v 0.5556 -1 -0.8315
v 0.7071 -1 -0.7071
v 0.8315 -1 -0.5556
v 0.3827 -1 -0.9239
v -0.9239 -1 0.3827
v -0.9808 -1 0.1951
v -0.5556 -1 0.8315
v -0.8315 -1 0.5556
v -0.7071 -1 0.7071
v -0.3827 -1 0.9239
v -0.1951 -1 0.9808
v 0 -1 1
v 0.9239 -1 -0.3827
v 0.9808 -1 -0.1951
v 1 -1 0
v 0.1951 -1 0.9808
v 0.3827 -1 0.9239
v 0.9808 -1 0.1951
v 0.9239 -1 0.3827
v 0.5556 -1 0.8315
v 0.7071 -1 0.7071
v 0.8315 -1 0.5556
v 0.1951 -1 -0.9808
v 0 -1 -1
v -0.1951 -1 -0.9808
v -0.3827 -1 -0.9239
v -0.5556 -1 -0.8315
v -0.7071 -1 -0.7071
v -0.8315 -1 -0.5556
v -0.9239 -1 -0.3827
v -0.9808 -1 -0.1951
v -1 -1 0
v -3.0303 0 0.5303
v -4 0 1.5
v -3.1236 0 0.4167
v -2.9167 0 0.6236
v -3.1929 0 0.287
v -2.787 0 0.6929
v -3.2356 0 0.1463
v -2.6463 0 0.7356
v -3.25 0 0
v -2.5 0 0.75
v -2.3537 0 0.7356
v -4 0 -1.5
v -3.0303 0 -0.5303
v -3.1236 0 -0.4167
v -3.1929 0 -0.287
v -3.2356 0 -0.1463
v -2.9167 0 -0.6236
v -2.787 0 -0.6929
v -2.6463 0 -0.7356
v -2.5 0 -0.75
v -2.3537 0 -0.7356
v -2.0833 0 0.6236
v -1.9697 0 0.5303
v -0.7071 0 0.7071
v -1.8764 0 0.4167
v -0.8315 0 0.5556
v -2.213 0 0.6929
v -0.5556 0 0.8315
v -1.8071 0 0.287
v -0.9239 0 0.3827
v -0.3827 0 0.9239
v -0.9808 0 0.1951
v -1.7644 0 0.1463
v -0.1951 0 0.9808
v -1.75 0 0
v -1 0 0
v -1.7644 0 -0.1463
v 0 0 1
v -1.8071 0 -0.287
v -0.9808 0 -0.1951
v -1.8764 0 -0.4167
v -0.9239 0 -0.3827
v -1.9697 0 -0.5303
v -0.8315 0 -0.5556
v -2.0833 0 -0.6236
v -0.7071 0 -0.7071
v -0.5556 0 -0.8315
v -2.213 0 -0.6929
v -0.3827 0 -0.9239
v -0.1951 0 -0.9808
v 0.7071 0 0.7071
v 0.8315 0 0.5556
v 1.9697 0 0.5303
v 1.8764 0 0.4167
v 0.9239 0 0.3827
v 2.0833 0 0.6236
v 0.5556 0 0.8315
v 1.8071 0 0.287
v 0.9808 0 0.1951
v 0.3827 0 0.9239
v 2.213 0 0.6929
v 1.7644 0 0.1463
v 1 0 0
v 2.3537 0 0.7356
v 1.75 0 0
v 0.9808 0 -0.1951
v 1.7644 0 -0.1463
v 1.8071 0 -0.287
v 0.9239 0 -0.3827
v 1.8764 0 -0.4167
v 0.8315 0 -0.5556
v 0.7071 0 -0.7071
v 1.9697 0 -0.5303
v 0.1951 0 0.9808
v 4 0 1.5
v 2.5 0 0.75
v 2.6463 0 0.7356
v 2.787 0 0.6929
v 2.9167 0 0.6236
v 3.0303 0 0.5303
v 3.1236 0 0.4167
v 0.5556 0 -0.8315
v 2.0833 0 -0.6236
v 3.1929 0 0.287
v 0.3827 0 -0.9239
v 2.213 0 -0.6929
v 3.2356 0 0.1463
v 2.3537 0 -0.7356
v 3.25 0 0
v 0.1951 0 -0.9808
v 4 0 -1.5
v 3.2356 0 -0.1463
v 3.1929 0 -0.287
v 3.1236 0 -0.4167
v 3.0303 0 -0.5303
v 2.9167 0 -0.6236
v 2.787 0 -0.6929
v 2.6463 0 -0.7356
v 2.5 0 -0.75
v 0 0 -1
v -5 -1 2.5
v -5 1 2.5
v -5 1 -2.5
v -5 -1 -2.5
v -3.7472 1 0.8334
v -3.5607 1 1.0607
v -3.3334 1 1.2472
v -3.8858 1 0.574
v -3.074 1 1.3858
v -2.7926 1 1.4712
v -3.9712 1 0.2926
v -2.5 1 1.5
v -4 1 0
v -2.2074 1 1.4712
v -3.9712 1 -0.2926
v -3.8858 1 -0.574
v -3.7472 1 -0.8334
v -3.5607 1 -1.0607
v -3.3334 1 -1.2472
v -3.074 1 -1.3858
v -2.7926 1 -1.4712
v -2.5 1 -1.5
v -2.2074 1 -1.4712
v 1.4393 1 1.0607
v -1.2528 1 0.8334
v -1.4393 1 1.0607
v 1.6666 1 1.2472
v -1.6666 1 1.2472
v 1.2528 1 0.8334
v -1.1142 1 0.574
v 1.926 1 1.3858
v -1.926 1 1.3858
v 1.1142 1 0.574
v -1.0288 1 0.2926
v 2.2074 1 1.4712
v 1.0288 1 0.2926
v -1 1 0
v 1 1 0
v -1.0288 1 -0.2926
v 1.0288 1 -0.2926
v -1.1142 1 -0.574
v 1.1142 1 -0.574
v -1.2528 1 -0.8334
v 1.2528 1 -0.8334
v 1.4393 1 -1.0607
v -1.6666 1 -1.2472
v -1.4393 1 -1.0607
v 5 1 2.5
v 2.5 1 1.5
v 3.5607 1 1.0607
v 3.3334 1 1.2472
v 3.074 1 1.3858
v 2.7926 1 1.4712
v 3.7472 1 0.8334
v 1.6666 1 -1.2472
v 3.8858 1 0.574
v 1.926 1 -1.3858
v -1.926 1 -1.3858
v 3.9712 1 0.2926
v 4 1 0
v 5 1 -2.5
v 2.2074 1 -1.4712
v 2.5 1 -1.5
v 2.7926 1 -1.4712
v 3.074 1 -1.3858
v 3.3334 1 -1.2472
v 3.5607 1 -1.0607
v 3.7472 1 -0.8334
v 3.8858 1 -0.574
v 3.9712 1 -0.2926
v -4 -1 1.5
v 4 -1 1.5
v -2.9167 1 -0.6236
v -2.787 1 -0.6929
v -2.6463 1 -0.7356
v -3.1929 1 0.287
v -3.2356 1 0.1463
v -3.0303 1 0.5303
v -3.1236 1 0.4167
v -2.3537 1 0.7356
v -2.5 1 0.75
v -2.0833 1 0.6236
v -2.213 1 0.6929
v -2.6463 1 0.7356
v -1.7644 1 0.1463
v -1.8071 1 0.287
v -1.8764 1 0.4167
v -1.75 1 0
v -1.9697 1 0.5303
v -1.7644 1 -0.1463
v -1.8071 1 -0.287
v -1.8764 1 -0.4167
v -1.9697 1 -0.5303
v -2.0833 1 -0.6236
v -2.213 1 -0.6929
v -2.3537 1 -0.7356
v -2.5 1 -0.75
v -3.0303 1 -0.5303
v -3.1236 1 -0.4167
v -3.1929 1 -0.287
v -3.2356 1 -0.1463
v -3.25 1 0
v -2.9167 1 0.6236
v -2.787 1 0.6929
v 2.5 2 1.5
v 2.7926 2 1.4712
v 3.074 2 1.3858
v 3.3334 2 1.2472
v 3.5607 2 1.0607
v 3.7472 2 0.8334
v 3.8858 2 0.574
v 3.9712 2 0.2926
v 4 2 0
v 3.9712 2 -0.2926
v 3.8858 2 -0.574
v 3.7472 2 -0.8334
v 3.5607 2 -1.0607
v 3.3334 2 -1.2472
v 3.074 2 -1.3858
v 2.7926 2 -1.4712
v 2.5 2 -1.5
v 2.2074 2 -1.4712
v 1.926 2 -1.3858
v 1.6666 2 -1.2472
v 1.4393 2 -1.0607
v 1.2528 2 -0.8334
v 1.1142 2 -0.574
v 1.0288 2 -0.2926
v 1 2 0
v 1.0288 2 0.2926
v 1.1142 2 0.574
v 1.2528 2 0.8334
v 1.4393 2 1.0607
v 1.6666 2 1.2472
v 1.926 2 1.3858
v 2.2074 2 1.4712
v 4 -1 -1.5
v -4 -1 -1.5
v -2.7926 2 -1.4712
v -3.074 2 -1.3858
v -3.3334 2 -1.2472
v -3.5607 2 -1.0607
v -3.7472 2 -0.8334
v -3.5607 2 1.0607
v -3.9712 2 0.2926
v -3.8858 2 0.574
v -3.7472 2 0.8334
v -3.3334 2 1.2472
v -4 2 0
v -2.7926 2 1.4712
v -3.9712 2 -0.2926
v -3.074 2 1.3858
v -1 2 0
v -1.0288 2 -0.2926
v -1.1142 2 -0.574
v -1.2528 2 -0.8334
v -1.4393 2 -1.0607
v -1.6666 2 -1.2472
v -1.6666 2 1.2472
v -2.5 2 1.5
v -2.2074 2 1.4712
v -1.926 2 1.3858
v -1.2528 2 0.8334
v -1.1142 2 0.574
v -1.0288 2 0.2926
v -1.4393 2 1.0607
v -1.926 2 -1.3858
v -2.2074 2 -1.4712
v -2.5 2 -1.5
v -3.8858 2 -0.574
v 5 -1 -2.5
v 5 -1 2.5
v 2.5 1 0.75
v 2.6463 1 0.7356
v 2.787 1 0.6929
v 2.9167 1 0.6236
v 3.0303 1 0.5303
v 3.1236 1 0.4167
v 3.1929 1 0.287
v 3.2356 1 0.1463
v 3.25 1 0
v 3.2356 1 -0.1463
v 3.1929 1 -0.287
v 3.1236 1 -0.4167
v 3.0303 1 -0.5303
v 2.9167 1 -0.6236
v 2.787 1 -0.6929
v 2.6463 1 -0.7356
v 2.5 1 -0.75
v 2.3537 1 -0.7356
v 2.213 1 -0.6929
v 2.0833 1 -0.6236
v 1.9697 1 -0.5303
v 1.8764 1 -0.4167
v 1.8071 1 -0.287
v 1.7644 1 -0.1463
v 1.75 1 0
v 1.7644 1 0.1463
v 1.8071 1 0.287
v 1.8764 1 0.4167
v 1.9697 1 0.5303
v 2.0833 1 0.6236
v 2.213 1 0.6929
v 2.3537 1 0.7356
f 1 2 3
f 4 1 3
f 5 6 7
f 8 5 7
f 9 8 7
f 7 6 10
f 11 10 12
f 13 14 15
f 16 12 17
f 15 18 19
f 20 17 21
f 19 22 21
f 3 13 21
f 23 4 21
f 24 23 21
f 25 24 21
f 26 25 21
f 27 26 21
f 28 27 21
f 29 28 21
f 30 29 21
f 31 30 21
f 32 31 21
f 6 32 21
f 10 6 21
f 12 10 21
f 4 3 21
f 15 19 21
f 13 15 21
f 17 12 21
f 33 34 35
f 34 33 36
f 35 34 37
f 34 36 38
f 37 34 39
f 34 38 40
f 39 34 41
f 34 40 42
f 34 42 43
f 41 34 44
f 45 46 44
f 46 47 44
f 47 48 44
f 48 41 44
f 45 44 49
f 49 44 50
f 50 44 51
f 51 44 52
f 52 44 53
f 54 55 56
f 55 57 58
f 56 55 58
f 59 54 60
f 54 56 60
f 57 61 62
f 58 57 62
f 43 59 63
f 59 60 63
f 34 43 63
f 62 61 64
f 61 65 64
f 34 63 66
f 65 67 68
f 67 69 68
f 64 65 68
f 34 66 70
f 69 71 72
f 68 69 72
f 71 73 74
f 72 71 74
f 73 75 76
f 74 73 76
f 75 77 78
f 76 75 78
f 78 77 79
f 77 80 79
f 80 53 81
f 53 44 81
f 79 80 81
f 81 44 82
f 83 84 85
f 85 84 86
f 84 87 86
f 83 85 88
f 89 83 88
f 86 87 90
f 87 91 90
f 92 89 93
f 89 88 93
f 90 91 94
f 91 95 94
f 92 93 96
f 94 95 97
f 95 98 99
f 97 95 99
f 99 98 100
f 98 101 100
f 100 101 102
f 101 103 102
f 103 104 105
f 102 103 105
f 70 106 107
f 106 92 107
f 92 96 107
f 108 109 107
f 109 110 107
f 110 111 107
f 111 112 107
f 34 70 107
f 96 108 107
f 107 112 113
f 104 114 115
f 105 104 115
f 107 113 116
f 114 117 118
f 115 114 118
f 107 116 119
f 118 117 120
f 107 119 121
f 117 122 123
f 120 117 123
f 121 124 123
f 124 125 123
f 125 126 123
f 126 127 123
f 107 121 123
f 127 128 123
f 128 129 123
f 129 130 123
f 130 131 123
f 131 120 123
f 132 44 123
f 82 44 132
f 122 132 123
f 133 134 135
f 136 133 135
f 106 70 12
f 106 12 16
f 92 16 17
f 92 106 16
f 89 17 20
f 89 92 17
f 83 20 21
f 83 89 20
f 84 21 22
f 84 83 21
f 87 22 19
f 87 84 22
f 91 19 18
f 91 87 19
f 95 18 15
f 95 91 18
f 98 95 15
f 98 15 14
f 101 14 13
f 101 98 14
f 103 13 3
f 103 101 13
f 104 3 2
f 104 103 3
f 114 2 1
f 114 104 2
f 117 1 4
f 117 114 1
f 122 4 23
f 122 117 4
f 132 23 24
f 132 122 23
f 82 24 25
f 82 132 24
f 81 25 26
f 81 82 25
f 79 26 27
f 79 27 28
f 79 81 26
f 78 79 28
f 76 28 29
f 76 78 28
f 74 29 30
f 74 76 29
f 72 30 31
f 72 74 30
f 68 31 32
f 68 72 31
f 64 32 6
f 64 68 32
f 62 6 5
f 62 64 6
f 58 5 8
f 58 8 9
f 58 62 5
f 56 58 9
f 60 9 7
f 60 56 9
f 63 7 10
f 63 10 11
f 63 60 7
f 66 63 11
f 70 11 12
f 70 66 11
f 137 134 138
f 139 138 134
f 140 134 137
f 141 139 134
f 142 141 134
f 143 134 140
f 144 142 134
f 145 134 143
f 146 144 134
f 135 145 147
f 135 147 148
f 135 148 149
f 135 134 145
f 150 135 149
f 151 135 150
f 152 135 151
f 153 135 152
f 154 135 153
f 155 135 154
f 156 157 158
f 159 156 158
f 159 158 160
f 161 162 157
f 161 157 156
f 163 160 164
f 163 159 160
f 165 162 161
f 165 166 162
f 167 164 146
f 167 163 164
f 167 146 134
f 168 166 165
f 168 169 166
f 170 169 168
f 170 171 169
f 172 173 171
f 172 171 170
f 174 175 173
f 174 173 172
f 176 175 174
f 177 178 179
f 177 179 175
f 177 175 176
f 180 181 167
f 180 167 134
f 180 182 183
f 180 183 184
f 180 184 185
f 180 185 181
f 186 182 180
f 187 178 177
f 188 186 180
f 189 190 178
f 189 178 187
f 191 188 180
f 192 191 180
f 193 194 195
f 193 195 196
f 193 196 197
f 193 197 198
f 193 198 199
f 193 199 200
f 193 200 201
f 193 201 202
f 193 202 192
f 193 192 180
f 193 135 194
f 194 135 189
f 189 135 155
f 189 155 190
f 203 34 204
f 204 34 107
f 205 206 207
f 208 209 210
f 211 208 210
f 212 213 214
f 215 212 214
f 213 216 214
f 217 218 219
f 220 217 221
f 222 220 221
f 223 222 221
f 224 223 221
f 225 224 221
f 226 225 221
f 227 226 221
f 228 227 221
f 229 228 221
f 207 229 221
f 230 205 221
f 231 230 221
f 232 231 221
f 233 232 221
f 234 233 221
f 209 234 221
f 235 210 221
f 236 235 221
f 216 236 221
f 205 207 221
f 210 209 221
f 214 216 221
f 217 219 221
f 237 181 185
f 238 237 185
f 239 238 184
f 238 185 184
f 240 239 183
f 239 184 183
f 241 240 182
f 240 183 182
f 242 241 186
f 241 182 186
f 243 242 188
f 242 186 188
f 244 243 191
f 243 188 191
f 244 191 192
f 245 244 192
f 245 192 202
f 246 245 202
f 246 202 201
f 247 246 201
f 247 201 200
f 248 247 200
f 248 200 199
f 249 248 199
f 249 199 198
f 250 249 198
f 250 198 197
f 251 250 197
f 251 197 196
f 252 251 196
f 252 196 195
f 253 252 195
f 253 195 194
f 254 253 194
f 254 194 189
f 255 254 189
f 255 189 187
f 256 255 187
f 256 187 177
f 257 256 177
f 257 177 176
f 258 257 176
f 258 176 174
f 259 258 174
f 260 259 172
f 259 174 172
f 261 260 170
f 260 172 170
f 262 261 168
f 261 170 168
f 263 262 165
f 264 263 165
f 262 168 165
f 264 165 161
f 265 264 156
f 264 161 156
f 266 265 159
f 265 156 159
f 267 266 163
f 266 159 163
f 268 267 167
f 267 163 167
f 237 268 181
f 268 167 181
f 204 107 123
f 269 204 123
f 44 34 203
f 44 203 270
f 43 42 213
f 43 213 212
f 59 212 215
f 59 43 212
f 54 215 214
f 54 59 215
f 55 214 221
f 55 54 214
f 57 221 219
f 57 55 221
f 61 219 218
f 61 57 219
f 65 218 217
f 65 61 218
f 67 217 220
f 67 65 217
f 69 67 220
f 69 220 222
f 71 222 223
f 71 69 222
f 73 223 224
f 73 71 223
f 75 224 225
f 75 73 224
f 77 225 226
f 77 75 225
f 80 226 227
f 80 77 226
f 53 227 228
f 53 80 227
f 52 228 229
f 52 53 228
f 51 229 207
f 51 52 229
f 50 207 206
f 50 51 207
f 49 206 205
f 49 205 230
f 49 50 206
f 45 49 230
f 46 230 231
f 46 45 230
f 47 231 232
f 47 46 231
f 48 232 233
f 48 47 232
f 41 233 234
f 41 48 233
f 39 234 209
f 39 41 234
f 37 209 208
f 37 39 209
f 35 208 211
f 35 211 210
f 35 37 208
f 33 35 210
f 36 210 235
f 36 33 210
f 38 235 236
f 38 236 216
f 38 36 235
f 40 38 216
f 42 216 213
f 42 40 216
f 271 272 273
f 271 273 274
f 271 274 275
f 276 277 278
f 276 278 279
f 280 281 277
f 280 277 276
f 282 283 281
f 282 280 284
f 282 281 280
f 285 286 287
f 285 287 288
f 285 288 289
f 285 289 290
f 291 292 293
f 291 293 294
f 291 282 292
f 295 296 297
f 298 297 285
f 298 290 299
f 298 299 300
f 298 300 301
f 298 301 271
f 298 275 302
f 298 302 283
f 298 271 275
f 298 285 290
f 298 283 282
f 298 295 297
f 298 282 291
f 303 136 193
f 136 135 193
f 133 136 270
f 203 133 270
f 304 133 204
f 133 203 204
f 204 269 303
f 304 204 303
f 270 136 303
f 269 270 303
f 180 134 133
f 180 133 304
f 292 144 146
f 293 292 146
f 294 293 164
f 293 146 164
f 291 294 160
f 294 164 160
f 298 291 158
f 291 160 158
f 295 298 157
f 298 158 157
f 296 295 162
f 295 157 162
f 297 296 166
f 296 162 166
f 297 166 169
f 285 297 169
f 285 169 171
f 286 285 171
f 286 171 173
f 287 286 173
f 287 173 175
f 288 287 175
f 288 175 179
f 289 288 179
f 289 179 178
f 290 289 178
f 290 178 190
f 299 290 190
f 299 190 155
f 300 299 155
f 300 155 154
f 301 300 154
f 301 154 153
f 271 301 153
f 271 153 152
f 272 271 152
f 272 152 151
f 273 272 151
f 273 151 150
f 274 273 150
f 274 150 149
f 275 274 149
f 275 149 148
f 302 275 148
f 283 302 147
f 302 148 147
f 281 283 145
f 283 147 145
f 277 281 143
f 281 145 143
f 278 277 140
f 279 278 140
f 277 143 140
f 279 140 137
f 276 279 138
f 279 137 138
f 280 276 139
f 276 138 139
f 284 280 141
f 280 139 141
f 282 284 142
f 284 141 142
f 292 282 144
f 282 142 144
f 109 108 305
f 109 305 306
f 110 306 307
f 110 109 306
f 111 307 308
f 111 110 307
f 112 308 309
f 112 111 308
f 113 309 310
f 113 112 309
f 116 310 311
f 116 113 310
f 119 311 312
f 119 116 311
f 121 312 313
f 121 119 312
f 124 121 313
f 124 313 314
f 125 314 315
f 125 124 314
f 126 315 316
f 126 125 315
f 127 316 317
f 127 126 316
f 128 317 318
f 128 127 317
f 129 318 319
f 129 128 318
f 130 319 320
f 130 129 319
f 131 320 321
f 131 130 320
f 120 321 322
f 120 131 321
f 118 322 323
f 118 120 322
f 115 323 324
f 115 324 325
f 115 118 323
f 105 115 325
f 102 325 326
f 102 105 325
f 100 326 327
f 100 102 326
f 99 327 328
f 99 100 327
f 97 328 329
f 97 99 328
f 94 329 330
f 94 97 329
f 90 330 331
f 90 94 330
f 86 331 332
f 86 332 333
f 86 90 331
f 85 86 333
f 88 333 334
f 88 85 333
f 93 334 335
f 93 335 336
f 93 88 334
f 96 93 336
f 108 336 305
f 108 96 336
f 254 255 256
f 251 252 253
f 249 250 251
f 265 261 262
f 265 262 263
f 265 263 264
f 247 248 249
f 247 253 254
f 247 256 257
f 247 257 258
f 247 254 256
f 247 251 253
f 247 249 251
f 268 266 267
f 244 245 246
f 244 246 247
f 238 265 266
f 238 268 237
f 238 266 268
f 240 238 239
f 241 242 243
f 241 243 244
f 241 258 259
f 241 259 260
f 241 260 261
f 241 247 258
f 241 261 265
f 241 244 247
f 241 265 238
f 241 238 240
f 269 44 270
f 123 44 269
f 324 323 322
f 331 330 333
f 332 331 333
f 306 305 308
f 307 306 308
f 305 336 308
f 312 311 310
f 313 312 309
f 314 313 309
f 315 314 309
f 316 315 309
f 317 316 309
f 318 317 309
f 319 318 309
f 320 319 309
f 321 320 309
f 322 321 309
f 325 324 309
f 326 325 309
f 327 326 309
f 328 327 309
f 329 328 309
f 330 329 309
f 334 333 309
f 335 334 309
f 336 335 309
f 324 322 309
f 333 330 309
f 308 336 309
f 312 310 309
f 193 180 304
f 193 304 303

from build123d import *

# Parameters (mm, degrees)
SKETCH1_R             = 1.5
BOSS_EXTRUDE1_DEPTH   = 2
BOSS_EXTRUDE1_2_DEPTH = 2
SKETCH1_3_W           = 10
SKETCH1_3_H           = 5
BOSS_EXTRUDE2_DEPTH   = 1
SKETCH1_4_R           = 0.75
CUT_EXTRUDE1_DEPTH    = 1
SKETCH1_5_W           = 10
SKETCH1_5_H           = 5
SKETCH1_5_W_2         = 8
SKETCH1_5_H_2         = 3
SKETCH1_5_R           = 1
BOSS_EXTRUDE3_DEPTH   = 1


with BuildPart() as part:
    # Sketch1 → Boss-Extrude1 (new body)
    with BuildSketch(Plane(origin=(0, 0, 0), x_dir=(1, 0, 0), z_dir=(0, 1, 0))):
        with Locations((-2.5, 0)):
            Circle(SKETCH1_R)
    extrude(amount=BOSS_EXTRUDE1_DEPTH)



with BuildPart() as body_2:
    # Sketch1 → Boss-Extrude1 2 (new body)
    with BuildSketch(Plane(origin=(0, 0, 0), x_dir=(1, 0, 0), z_dir=(0, 1, 0))):
        with Locations((2.5, 0)):
            Circle(SKETCH1_R)
    extrude(amount=BOSS_EXTRUDE1_2_DEPTH)


with BuildPart() as part_1:
    add(part.part)

    add(body_2.part)  # Boss-Extrude2 merges body 2
    # Sketch1<3> → Boss-Extrude2 (add)
    with BuildSketch(Plane(origin=(0, 0, 0), x_dir=(1, 0, 0), z_dir=(0, 1, 0))):
        Rectangle(SKETCH1_3_W, SKETCH1_3_H)
    extrude(amount=BOSS_EXTRUDE2_DEPTH)

    # Sketch1<4> → Cut-Extrude1 (cut)
    with BuildSketch(Plane(origin=(0, 0, 0), x_dir=(1, 0, 0), z_dir=(0, 1, 0))):
        with Locations((-2.5, 0)):
            Circle(SKETCH1_4_R)
        with Locations((2.5, 0)):
            Circle(SKETCH1_4_R)
    extrude(amount=CUT_EXTRUDE1_DEPTH, mode=Mode.SUBTRACT)

    # Sketch1<5> → Boss-Extrude3 (add)
    # profile 1 of 2: a face of its own
    with BuildSketch(Plane(origin=(0, 0, 0), x_dir=(1, 0, 0), z_dir=(0, 1, 0))):
        Rectangle(SKETCH1_5_W, SKETCH1_5_H)
        Rectangle(SKETCH1_5_W_2, SKETCH1_5_H_2, mode=Mode.SUBTRACT)
    # profile 2 of 2: a face of its own
    with BuildSketch(Plane(origin=(0, 0, 0), x_dir=(1, 0, 0), z_dir=(0, 1, 0))):
        Circle(SKETCH1_5_R)
    extrude(amount=-BOSS_EXTRUDE3_DEPTH)


solid = part_1.part
